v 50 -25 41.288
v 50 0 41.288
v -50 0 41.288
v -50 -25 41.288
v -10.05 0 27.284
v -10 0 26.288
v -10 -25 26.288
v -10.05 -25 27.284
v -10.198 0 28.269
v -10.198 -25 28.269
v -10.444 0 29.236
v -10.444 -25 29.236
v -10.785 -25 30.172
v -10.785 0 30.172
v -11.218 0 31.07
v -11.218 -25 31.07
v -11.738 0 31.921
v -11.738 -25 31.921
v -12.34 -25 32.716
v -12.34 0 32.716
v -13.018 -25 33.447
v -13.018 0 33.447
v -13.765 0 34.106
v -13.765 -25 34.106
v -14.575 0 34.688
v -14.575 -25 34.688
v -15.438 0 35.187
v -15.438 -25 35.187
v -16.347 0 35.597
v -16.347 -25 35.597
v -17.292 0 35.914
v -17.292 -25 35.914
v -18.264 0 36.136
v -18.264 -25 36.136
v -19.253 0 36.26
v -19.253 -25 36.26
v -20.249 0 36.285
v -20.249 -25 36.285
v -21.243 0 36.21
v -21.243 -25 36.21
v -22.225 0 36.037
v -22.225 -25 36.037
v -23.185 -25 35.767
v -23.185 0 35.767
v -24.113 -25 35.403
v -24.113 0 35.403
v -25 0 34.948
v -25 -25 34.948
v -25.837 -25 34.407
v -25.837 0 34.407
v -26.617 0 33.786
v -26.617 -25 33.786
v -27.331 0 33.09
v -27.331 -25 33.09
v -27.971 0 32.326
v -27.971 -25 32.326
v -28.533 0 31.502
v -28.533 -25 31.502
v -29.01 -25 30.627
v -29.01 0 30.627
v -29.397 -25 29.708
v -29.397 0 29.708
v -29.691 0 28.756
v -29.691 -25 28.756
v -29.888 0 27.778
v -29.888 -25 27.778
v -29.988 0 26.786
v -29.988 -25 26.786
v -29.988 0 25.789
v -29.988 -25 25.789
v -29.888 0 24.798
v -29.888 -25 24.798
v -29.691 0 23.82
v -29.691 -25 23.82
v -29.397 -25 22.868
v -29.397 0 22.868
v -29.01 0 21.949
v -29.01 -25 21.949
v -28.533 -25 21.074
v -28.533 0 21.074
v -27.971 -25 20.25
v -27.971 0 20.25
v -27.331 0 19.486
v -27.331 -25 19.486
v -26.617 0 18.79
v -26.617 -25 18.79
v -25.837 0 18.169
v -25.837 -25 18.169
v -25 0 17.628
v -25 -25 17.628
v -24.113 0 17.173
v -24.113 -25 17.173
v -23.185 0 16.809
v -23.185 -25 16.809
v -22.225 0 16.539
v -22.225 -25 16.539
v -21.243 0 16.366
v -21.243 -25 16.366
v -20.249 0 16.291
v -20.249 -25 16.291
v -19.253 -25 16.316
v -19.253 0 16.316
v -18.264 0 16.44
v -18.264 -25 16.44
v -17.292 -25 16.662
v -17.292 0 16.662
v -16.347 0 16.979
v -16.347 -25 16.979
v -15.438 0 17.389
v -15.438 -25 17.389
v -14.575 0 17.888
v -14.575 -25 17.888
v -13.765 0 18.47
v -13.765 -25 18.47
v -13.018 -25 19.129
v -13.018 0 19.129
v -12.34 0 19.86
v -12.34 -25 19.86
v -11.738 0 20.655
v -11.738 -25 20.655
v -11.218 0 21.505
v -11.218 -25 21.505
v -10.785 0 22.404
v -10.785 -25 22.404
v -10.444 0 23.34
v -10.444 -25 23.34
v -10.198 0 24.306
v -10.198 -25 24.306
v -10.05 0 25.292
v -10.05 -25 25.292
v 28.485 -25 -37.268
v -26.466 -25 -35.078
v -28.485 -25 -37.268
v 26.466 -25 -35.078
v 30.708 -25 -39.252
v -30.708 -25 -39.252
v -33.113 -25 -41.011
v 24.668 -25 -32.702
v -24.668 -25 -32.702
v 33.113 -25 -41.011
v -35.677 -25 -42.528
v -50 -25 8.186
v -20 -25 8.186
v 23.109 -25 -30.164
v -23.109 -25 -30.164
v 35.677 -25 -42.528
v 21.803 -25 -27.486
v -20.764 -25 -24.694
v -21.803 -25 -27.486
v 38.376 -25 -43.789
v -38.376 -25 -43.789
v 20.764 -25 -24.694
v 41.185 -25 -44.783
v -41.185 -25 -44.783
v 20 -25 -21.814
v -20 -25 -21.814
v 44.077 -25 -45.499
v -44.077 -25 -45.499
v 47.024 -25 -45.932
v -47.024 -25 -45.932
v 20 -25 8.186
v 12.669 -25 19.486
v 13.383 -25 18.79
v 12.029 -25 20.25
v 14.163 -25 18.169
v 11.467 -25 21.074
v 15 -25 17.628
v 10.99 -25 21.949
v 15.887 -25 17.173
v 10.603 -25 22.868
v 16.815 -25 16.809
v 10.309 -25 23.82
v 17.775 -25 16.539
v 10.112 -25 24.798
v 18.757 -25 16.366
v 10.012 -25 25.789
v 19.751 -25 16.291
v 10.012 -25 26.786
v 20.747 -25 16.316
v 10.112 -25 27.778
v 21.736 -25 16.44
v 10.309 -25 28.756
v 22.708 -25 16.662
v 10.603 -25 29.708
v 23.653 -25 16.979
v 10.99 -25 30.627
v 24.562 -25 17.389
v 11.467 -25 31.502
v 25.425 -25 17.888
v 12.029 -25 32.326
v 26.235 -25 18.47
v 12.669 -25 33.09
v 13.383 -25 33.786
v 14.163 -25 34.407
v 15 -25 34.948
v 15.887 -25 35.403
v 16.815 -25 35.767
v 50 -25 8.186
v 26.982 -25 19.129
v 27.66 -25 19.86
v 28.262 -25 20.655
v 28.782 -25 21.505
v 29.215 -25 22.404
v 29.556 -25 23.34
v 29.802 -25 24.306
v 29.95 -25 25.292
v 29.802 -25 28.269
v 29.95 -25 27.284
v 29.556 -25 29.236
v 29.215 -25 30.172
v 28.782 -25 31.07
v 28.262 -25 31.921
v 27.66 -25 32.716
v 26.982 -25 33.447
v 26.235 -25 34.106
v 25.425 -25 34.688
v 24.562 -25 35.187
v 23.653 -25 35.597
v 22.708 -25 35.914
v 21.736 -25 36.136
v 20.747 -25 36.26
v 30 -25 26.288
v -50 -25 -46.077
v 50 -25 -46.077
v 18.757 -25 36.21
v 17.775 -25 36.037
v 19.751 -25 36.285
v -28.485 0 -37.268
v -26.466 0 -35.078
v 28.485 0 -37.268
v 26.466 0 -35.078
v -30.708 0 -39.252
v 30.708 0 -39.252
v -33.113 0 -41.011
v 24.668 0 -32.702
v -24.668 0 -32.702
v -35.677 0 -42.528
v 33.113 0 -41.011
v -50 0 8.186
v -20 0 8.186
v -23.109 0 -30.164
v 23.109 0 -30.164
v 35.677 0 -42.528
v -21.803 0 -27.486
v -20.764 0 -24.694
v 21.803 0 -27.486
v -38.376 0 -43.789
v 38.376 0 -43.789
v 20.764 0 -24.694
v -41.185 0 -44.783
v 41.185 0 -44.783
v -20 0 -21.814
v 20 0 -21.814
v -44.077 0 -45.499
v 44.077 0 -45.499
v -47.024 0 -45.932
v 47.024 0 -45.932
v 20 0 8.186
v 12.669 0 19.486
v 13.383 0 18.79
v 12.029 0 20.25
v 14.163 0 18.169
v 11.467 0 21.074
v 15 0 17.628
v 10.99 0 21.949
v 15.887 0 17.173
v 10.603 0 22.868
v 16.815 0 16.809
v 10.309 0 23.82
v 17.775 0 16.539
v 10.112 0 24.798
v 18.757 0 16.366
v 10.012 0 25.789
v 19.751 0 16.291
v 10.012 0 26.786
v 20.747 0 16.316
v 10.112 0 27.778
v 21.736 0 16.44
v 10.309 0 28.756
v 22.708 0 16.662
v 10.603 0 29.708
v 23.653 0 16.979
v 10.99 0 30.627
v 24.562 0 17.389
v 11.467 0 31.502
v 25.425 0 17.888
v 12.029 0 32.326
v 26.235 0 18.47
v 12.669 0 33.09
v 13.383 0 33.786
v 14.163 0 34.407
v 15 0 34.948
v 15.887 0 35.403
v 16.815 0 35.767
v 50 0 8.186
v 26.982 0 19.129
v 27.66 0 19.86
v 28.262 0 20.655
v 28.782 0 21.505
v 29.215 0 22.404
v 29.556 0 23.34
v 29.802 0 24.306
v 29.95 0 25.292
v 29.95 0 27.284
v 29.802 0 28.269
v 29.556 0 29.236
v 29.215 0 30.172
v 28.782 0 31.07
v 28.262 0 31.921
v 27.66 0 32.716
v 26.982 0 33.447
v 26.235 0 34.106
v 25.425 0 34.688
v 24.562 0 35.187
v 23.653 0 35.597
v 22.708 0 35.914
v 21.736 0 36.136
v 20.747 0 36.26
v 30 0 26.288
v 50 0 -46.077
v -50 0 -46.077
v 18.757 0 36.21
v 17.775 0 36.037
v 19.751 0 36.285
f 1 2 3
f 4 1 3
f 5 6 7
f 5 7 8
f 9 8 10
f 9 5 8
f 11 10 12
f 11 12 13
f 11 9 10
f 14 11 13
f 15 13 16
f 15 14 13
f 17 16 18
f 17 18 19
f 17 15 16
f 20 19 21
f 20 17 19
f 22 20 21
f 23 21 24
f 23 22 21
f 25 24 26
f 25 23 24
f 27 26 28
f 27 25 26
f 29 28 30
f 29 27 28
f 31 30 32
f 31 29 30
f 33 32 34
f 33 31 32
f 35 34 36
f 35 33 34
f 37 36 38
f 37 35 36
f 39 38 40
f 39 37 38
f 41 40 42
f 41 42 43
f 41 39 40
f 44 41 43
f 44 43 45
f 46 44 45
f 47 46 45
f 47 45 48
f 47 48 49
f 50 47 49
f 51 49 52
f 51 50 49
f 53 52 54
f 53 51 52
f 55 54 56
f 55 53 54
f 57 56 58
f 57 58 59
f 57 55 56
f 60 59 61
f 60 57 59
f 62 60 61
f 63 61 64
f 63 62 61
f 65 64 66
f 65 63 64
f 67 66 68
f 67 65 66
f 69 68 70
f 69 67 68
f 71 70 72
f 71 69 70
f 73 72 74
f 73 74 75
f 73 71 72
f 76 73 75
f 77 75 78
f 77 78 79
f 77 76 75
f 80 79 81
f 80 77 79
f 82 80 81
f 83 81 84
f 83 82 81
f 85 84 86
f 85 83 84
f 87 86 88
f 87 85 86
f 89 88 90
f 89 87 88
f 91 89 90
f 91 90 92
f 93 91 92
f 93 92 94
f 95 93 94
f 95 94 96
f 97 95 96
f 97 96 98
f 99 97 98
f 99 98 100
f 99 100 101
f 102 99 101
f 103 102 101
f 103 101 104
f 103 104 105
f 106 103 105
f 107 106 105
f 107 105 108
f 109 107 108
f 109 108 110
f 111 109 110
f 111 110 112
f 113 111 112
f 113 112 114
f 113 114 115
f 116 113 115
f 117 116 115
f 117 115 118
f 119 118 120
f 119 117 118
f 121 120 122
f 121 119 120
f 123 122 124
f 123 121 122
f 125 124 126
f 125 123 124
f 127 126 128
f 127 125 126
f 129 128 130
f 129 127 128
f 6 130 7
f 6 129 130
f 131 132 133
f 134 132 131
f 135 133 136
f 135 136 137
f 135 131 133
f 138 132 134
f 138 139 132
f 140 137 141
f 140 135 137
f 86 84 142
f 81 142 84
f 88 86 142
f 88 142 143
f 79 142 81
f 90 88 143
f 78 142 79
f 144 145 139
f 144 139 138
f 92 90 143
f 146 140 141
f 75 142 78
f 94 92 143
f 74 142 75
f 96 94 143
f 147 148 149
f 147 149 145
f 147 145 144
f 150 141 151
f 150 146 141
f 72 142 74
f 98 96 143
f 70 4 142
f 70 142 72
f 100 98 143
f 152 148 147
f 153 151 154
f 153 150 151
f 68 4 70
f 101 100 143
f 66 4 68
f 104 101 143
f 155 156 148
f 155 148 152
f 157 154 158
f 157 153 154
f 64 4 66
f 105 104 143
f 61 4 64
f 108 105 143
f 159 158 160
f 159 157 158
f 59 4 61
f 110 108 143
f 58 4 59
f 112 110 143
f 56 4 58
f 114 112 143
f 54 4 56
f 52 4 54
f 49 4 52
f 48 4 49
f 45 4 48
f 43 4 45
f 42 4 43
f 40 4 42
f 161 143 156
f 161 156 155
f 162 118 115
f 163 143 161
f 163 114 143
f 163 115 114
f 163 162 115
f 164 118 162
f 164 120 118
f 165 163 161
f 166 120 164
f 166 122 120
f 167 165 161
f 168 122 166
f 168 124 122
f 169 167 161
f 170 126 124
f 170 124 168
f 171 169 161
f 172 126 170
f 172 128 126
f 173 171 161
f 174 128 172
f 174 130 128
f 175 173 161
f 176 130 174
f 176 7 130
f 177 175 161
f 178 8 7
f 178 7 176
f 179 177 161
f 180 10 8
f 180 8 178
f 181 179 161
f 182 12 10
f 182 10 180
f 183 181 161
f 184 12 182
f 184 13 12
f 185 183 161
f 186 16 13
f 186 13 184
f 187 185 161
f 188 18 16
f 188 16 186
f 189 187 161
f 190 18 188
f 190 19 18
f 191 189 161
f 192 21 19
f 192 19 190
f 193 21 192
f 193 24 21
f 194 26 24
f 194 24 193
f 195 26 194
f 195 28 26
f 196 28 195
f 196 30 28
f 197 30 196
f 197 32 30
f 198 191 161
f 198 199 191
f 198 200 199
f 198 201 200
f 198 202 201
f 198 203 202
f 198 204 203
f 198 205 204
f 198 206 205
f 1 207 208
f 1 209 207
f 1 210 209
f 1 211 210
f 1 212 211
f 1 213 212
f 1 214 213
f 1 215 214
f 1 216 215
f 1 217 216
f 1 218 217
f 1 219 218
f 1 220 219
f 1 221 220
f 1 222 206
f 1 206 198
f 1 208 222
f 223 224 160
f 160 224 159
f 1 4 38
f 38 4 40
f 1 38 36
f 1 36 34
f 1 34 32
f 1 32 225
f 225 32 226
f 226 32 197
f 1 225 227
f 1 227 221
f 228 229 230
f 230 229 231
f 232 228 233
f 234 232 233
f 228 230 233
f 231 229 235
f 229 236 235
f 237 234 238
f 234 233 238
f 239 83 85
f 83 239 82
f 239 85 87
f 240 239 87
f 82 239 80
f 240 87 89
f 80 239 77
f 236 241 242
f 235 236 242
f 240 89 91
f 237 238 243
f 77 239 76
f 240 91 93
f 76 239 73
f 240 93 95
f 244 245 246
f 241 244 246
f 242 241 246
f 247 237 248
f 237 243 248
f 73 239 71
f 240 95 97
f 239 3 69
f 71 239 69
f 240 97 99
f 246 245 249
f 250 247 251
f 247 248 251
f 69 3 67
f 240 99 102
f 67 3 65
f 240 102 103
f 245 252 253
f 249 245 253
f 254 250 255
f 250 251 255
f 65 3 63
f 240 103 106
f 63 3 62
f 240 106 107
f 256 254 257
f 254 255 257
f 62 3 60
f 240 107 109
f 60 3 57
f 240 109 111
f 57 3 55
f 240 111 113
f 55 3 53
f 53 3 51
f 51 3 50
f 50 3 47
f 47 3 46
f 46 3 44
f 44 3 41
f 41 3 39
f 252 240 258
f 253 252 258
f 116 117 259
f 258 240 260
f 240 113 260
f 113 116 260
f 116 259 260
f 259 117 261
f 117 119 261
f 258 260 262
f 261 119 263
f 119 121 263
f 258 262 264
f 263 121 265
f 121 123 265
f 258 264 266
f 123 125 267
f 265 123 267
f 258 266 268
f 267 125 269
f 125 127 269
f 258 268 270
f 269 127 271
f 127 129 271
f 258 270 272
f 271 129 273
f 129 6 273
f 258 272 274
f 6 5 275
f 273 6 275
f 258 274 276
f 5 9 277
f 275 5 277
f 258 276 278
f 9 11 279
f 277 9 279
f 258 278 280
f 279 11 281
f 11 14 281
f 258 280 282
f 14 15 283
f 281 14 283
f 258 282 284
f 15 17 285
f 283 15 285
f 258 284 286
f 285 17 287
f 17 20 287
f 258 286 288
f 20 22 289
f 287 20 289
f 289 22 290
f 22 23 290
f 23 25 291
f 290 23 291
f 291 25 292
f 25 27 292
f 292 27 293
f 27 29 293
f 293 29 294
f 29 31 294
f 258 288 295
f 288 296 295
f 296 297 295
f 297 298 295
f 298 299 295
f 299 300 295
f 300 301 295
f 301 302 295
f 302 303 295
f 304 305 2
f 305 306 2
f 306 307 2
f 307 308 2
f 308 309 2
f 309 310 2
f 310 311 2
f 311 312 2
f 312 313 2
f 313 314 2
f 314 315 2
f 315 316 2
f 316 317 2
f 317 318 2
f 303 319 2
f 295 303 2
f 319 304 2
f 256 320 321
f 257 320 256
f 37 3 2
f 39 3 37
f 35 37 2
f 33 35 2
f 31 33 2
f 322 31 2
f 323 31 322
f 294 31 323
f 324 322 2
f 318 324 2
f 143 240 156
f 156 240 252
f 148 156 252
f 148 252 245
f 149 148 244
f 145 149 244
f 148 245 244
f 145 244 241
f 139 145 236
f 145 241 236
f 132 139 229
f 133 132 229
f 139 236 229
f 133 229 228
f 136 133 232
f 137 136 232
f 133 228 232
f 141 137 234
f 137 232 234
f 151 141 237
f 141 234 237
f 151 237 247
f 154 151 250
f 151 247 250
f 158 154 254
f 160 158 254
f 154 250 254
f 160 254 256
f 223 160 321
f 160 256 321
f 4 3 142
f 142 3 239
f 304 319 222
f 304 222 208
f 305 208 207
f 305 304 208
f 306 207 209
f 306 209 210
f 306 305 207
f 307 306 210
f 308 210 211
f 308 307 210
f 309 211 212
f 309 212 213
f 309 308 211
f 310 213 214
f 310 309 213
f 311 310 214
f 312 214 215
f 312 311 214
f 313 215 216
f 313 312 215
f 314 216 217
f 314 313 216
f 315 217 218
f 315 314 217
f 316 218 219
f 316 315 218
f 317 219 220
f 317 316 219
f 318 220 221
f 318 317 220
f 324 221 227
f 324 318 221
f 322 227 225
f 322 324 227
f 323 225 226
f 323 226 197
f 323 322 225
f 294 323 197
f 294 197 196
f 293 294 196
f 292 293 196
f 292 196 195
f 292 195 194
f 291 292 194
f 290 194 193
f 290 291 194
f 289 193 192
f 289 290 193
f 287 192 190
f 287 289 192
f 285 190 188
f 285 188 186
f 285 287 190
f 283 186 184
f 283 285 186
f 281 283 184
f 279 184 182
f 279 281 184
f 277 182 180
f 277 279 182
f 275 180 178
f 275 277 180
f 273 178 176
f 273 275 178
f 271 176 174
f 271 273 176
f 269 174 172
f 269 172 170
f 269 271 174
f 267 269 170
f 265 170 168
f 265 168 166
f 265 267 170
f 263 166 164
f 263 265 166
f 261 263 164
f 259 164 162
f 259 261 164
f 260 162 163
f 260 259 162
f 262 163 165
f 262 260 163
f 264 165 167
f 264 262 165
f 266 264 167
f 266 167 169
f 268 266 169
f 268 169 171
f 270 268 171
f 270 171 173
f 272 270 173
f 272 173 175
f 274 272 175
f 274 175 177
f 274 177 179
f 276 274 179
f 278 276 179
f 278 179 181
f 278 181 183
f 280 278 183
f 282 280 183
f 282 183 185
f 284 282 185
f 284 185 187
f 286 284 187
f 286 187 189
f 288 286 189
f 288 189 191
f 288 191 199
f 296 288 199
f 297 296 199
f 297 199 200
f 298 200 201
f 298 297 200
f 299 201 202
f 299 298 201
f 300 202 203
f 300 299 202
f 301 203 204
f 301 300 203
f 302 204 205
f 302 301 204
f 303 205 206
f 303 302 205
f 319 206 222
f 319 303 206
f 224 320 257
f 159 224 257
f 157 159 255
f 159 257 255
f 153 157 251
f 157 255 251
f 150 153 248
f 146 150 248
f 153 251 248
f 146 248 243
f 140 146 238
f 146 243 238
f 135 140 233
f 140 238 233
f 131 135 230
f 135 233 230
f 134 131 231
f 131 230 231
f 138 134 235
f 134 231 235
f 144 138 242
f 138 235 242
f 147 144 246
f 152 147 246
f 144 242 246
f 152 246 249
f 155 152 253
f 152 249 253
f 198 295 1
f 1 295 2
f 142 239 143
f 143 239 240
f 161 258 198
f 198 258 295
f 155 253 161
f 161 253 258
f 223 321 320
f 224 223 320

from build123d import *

# Parameters (mm, degrees)
F0_R     = 10
F1_DEPTH = 25


# Not quite as in the source:
# - the program builds the solid bodies; features that only make, move or delete a surface that nothing else refers to are left out


with BuildPart() as f1:
    # F0 (on Front) → F1 (new body)
    with BuildSketch(Plane.XZ):
        with BuildLine():
            ThreePointArc((-20, -21.8138062528), (-30.7082507277, -39.2518025849), (-50, -46.0766659346))
            Line((-50, -46.0766659346), (50, -46.0766659346))
            ThreePointArc((50, -46.0766659346), (30.7082507277, -39.2518025849), (20, -21.8138062528))
            Line((20, -21.8138062528), (20, 8.1861937472))
            Line((20, 8.1861937472), (50, 8.1861937472))
            Line((50, 8.1861937472), (50, 41.2879567593))
            Line((50, 41.2879567593), (-50, 41.2879567593))
            Line((-50, 41.2879567593), (-50, 8.1861937472))
            Line((-50, 8.1861937472), (-20, 8.1861937472))
            Line((-20, 8.1861937472), (-20, -21.8138062528))
        make_face()
        with Locations((-20, 26.2879567593)):
            Circle(F0_R, mode=Mode.SUBTRACT)
        with Locations((20, 26.2879567593)):
            Circle(F0_R, mode=Mode.SUBTRACT)
    extrude(amount=F1_DEPTH)


solid = f1.part
